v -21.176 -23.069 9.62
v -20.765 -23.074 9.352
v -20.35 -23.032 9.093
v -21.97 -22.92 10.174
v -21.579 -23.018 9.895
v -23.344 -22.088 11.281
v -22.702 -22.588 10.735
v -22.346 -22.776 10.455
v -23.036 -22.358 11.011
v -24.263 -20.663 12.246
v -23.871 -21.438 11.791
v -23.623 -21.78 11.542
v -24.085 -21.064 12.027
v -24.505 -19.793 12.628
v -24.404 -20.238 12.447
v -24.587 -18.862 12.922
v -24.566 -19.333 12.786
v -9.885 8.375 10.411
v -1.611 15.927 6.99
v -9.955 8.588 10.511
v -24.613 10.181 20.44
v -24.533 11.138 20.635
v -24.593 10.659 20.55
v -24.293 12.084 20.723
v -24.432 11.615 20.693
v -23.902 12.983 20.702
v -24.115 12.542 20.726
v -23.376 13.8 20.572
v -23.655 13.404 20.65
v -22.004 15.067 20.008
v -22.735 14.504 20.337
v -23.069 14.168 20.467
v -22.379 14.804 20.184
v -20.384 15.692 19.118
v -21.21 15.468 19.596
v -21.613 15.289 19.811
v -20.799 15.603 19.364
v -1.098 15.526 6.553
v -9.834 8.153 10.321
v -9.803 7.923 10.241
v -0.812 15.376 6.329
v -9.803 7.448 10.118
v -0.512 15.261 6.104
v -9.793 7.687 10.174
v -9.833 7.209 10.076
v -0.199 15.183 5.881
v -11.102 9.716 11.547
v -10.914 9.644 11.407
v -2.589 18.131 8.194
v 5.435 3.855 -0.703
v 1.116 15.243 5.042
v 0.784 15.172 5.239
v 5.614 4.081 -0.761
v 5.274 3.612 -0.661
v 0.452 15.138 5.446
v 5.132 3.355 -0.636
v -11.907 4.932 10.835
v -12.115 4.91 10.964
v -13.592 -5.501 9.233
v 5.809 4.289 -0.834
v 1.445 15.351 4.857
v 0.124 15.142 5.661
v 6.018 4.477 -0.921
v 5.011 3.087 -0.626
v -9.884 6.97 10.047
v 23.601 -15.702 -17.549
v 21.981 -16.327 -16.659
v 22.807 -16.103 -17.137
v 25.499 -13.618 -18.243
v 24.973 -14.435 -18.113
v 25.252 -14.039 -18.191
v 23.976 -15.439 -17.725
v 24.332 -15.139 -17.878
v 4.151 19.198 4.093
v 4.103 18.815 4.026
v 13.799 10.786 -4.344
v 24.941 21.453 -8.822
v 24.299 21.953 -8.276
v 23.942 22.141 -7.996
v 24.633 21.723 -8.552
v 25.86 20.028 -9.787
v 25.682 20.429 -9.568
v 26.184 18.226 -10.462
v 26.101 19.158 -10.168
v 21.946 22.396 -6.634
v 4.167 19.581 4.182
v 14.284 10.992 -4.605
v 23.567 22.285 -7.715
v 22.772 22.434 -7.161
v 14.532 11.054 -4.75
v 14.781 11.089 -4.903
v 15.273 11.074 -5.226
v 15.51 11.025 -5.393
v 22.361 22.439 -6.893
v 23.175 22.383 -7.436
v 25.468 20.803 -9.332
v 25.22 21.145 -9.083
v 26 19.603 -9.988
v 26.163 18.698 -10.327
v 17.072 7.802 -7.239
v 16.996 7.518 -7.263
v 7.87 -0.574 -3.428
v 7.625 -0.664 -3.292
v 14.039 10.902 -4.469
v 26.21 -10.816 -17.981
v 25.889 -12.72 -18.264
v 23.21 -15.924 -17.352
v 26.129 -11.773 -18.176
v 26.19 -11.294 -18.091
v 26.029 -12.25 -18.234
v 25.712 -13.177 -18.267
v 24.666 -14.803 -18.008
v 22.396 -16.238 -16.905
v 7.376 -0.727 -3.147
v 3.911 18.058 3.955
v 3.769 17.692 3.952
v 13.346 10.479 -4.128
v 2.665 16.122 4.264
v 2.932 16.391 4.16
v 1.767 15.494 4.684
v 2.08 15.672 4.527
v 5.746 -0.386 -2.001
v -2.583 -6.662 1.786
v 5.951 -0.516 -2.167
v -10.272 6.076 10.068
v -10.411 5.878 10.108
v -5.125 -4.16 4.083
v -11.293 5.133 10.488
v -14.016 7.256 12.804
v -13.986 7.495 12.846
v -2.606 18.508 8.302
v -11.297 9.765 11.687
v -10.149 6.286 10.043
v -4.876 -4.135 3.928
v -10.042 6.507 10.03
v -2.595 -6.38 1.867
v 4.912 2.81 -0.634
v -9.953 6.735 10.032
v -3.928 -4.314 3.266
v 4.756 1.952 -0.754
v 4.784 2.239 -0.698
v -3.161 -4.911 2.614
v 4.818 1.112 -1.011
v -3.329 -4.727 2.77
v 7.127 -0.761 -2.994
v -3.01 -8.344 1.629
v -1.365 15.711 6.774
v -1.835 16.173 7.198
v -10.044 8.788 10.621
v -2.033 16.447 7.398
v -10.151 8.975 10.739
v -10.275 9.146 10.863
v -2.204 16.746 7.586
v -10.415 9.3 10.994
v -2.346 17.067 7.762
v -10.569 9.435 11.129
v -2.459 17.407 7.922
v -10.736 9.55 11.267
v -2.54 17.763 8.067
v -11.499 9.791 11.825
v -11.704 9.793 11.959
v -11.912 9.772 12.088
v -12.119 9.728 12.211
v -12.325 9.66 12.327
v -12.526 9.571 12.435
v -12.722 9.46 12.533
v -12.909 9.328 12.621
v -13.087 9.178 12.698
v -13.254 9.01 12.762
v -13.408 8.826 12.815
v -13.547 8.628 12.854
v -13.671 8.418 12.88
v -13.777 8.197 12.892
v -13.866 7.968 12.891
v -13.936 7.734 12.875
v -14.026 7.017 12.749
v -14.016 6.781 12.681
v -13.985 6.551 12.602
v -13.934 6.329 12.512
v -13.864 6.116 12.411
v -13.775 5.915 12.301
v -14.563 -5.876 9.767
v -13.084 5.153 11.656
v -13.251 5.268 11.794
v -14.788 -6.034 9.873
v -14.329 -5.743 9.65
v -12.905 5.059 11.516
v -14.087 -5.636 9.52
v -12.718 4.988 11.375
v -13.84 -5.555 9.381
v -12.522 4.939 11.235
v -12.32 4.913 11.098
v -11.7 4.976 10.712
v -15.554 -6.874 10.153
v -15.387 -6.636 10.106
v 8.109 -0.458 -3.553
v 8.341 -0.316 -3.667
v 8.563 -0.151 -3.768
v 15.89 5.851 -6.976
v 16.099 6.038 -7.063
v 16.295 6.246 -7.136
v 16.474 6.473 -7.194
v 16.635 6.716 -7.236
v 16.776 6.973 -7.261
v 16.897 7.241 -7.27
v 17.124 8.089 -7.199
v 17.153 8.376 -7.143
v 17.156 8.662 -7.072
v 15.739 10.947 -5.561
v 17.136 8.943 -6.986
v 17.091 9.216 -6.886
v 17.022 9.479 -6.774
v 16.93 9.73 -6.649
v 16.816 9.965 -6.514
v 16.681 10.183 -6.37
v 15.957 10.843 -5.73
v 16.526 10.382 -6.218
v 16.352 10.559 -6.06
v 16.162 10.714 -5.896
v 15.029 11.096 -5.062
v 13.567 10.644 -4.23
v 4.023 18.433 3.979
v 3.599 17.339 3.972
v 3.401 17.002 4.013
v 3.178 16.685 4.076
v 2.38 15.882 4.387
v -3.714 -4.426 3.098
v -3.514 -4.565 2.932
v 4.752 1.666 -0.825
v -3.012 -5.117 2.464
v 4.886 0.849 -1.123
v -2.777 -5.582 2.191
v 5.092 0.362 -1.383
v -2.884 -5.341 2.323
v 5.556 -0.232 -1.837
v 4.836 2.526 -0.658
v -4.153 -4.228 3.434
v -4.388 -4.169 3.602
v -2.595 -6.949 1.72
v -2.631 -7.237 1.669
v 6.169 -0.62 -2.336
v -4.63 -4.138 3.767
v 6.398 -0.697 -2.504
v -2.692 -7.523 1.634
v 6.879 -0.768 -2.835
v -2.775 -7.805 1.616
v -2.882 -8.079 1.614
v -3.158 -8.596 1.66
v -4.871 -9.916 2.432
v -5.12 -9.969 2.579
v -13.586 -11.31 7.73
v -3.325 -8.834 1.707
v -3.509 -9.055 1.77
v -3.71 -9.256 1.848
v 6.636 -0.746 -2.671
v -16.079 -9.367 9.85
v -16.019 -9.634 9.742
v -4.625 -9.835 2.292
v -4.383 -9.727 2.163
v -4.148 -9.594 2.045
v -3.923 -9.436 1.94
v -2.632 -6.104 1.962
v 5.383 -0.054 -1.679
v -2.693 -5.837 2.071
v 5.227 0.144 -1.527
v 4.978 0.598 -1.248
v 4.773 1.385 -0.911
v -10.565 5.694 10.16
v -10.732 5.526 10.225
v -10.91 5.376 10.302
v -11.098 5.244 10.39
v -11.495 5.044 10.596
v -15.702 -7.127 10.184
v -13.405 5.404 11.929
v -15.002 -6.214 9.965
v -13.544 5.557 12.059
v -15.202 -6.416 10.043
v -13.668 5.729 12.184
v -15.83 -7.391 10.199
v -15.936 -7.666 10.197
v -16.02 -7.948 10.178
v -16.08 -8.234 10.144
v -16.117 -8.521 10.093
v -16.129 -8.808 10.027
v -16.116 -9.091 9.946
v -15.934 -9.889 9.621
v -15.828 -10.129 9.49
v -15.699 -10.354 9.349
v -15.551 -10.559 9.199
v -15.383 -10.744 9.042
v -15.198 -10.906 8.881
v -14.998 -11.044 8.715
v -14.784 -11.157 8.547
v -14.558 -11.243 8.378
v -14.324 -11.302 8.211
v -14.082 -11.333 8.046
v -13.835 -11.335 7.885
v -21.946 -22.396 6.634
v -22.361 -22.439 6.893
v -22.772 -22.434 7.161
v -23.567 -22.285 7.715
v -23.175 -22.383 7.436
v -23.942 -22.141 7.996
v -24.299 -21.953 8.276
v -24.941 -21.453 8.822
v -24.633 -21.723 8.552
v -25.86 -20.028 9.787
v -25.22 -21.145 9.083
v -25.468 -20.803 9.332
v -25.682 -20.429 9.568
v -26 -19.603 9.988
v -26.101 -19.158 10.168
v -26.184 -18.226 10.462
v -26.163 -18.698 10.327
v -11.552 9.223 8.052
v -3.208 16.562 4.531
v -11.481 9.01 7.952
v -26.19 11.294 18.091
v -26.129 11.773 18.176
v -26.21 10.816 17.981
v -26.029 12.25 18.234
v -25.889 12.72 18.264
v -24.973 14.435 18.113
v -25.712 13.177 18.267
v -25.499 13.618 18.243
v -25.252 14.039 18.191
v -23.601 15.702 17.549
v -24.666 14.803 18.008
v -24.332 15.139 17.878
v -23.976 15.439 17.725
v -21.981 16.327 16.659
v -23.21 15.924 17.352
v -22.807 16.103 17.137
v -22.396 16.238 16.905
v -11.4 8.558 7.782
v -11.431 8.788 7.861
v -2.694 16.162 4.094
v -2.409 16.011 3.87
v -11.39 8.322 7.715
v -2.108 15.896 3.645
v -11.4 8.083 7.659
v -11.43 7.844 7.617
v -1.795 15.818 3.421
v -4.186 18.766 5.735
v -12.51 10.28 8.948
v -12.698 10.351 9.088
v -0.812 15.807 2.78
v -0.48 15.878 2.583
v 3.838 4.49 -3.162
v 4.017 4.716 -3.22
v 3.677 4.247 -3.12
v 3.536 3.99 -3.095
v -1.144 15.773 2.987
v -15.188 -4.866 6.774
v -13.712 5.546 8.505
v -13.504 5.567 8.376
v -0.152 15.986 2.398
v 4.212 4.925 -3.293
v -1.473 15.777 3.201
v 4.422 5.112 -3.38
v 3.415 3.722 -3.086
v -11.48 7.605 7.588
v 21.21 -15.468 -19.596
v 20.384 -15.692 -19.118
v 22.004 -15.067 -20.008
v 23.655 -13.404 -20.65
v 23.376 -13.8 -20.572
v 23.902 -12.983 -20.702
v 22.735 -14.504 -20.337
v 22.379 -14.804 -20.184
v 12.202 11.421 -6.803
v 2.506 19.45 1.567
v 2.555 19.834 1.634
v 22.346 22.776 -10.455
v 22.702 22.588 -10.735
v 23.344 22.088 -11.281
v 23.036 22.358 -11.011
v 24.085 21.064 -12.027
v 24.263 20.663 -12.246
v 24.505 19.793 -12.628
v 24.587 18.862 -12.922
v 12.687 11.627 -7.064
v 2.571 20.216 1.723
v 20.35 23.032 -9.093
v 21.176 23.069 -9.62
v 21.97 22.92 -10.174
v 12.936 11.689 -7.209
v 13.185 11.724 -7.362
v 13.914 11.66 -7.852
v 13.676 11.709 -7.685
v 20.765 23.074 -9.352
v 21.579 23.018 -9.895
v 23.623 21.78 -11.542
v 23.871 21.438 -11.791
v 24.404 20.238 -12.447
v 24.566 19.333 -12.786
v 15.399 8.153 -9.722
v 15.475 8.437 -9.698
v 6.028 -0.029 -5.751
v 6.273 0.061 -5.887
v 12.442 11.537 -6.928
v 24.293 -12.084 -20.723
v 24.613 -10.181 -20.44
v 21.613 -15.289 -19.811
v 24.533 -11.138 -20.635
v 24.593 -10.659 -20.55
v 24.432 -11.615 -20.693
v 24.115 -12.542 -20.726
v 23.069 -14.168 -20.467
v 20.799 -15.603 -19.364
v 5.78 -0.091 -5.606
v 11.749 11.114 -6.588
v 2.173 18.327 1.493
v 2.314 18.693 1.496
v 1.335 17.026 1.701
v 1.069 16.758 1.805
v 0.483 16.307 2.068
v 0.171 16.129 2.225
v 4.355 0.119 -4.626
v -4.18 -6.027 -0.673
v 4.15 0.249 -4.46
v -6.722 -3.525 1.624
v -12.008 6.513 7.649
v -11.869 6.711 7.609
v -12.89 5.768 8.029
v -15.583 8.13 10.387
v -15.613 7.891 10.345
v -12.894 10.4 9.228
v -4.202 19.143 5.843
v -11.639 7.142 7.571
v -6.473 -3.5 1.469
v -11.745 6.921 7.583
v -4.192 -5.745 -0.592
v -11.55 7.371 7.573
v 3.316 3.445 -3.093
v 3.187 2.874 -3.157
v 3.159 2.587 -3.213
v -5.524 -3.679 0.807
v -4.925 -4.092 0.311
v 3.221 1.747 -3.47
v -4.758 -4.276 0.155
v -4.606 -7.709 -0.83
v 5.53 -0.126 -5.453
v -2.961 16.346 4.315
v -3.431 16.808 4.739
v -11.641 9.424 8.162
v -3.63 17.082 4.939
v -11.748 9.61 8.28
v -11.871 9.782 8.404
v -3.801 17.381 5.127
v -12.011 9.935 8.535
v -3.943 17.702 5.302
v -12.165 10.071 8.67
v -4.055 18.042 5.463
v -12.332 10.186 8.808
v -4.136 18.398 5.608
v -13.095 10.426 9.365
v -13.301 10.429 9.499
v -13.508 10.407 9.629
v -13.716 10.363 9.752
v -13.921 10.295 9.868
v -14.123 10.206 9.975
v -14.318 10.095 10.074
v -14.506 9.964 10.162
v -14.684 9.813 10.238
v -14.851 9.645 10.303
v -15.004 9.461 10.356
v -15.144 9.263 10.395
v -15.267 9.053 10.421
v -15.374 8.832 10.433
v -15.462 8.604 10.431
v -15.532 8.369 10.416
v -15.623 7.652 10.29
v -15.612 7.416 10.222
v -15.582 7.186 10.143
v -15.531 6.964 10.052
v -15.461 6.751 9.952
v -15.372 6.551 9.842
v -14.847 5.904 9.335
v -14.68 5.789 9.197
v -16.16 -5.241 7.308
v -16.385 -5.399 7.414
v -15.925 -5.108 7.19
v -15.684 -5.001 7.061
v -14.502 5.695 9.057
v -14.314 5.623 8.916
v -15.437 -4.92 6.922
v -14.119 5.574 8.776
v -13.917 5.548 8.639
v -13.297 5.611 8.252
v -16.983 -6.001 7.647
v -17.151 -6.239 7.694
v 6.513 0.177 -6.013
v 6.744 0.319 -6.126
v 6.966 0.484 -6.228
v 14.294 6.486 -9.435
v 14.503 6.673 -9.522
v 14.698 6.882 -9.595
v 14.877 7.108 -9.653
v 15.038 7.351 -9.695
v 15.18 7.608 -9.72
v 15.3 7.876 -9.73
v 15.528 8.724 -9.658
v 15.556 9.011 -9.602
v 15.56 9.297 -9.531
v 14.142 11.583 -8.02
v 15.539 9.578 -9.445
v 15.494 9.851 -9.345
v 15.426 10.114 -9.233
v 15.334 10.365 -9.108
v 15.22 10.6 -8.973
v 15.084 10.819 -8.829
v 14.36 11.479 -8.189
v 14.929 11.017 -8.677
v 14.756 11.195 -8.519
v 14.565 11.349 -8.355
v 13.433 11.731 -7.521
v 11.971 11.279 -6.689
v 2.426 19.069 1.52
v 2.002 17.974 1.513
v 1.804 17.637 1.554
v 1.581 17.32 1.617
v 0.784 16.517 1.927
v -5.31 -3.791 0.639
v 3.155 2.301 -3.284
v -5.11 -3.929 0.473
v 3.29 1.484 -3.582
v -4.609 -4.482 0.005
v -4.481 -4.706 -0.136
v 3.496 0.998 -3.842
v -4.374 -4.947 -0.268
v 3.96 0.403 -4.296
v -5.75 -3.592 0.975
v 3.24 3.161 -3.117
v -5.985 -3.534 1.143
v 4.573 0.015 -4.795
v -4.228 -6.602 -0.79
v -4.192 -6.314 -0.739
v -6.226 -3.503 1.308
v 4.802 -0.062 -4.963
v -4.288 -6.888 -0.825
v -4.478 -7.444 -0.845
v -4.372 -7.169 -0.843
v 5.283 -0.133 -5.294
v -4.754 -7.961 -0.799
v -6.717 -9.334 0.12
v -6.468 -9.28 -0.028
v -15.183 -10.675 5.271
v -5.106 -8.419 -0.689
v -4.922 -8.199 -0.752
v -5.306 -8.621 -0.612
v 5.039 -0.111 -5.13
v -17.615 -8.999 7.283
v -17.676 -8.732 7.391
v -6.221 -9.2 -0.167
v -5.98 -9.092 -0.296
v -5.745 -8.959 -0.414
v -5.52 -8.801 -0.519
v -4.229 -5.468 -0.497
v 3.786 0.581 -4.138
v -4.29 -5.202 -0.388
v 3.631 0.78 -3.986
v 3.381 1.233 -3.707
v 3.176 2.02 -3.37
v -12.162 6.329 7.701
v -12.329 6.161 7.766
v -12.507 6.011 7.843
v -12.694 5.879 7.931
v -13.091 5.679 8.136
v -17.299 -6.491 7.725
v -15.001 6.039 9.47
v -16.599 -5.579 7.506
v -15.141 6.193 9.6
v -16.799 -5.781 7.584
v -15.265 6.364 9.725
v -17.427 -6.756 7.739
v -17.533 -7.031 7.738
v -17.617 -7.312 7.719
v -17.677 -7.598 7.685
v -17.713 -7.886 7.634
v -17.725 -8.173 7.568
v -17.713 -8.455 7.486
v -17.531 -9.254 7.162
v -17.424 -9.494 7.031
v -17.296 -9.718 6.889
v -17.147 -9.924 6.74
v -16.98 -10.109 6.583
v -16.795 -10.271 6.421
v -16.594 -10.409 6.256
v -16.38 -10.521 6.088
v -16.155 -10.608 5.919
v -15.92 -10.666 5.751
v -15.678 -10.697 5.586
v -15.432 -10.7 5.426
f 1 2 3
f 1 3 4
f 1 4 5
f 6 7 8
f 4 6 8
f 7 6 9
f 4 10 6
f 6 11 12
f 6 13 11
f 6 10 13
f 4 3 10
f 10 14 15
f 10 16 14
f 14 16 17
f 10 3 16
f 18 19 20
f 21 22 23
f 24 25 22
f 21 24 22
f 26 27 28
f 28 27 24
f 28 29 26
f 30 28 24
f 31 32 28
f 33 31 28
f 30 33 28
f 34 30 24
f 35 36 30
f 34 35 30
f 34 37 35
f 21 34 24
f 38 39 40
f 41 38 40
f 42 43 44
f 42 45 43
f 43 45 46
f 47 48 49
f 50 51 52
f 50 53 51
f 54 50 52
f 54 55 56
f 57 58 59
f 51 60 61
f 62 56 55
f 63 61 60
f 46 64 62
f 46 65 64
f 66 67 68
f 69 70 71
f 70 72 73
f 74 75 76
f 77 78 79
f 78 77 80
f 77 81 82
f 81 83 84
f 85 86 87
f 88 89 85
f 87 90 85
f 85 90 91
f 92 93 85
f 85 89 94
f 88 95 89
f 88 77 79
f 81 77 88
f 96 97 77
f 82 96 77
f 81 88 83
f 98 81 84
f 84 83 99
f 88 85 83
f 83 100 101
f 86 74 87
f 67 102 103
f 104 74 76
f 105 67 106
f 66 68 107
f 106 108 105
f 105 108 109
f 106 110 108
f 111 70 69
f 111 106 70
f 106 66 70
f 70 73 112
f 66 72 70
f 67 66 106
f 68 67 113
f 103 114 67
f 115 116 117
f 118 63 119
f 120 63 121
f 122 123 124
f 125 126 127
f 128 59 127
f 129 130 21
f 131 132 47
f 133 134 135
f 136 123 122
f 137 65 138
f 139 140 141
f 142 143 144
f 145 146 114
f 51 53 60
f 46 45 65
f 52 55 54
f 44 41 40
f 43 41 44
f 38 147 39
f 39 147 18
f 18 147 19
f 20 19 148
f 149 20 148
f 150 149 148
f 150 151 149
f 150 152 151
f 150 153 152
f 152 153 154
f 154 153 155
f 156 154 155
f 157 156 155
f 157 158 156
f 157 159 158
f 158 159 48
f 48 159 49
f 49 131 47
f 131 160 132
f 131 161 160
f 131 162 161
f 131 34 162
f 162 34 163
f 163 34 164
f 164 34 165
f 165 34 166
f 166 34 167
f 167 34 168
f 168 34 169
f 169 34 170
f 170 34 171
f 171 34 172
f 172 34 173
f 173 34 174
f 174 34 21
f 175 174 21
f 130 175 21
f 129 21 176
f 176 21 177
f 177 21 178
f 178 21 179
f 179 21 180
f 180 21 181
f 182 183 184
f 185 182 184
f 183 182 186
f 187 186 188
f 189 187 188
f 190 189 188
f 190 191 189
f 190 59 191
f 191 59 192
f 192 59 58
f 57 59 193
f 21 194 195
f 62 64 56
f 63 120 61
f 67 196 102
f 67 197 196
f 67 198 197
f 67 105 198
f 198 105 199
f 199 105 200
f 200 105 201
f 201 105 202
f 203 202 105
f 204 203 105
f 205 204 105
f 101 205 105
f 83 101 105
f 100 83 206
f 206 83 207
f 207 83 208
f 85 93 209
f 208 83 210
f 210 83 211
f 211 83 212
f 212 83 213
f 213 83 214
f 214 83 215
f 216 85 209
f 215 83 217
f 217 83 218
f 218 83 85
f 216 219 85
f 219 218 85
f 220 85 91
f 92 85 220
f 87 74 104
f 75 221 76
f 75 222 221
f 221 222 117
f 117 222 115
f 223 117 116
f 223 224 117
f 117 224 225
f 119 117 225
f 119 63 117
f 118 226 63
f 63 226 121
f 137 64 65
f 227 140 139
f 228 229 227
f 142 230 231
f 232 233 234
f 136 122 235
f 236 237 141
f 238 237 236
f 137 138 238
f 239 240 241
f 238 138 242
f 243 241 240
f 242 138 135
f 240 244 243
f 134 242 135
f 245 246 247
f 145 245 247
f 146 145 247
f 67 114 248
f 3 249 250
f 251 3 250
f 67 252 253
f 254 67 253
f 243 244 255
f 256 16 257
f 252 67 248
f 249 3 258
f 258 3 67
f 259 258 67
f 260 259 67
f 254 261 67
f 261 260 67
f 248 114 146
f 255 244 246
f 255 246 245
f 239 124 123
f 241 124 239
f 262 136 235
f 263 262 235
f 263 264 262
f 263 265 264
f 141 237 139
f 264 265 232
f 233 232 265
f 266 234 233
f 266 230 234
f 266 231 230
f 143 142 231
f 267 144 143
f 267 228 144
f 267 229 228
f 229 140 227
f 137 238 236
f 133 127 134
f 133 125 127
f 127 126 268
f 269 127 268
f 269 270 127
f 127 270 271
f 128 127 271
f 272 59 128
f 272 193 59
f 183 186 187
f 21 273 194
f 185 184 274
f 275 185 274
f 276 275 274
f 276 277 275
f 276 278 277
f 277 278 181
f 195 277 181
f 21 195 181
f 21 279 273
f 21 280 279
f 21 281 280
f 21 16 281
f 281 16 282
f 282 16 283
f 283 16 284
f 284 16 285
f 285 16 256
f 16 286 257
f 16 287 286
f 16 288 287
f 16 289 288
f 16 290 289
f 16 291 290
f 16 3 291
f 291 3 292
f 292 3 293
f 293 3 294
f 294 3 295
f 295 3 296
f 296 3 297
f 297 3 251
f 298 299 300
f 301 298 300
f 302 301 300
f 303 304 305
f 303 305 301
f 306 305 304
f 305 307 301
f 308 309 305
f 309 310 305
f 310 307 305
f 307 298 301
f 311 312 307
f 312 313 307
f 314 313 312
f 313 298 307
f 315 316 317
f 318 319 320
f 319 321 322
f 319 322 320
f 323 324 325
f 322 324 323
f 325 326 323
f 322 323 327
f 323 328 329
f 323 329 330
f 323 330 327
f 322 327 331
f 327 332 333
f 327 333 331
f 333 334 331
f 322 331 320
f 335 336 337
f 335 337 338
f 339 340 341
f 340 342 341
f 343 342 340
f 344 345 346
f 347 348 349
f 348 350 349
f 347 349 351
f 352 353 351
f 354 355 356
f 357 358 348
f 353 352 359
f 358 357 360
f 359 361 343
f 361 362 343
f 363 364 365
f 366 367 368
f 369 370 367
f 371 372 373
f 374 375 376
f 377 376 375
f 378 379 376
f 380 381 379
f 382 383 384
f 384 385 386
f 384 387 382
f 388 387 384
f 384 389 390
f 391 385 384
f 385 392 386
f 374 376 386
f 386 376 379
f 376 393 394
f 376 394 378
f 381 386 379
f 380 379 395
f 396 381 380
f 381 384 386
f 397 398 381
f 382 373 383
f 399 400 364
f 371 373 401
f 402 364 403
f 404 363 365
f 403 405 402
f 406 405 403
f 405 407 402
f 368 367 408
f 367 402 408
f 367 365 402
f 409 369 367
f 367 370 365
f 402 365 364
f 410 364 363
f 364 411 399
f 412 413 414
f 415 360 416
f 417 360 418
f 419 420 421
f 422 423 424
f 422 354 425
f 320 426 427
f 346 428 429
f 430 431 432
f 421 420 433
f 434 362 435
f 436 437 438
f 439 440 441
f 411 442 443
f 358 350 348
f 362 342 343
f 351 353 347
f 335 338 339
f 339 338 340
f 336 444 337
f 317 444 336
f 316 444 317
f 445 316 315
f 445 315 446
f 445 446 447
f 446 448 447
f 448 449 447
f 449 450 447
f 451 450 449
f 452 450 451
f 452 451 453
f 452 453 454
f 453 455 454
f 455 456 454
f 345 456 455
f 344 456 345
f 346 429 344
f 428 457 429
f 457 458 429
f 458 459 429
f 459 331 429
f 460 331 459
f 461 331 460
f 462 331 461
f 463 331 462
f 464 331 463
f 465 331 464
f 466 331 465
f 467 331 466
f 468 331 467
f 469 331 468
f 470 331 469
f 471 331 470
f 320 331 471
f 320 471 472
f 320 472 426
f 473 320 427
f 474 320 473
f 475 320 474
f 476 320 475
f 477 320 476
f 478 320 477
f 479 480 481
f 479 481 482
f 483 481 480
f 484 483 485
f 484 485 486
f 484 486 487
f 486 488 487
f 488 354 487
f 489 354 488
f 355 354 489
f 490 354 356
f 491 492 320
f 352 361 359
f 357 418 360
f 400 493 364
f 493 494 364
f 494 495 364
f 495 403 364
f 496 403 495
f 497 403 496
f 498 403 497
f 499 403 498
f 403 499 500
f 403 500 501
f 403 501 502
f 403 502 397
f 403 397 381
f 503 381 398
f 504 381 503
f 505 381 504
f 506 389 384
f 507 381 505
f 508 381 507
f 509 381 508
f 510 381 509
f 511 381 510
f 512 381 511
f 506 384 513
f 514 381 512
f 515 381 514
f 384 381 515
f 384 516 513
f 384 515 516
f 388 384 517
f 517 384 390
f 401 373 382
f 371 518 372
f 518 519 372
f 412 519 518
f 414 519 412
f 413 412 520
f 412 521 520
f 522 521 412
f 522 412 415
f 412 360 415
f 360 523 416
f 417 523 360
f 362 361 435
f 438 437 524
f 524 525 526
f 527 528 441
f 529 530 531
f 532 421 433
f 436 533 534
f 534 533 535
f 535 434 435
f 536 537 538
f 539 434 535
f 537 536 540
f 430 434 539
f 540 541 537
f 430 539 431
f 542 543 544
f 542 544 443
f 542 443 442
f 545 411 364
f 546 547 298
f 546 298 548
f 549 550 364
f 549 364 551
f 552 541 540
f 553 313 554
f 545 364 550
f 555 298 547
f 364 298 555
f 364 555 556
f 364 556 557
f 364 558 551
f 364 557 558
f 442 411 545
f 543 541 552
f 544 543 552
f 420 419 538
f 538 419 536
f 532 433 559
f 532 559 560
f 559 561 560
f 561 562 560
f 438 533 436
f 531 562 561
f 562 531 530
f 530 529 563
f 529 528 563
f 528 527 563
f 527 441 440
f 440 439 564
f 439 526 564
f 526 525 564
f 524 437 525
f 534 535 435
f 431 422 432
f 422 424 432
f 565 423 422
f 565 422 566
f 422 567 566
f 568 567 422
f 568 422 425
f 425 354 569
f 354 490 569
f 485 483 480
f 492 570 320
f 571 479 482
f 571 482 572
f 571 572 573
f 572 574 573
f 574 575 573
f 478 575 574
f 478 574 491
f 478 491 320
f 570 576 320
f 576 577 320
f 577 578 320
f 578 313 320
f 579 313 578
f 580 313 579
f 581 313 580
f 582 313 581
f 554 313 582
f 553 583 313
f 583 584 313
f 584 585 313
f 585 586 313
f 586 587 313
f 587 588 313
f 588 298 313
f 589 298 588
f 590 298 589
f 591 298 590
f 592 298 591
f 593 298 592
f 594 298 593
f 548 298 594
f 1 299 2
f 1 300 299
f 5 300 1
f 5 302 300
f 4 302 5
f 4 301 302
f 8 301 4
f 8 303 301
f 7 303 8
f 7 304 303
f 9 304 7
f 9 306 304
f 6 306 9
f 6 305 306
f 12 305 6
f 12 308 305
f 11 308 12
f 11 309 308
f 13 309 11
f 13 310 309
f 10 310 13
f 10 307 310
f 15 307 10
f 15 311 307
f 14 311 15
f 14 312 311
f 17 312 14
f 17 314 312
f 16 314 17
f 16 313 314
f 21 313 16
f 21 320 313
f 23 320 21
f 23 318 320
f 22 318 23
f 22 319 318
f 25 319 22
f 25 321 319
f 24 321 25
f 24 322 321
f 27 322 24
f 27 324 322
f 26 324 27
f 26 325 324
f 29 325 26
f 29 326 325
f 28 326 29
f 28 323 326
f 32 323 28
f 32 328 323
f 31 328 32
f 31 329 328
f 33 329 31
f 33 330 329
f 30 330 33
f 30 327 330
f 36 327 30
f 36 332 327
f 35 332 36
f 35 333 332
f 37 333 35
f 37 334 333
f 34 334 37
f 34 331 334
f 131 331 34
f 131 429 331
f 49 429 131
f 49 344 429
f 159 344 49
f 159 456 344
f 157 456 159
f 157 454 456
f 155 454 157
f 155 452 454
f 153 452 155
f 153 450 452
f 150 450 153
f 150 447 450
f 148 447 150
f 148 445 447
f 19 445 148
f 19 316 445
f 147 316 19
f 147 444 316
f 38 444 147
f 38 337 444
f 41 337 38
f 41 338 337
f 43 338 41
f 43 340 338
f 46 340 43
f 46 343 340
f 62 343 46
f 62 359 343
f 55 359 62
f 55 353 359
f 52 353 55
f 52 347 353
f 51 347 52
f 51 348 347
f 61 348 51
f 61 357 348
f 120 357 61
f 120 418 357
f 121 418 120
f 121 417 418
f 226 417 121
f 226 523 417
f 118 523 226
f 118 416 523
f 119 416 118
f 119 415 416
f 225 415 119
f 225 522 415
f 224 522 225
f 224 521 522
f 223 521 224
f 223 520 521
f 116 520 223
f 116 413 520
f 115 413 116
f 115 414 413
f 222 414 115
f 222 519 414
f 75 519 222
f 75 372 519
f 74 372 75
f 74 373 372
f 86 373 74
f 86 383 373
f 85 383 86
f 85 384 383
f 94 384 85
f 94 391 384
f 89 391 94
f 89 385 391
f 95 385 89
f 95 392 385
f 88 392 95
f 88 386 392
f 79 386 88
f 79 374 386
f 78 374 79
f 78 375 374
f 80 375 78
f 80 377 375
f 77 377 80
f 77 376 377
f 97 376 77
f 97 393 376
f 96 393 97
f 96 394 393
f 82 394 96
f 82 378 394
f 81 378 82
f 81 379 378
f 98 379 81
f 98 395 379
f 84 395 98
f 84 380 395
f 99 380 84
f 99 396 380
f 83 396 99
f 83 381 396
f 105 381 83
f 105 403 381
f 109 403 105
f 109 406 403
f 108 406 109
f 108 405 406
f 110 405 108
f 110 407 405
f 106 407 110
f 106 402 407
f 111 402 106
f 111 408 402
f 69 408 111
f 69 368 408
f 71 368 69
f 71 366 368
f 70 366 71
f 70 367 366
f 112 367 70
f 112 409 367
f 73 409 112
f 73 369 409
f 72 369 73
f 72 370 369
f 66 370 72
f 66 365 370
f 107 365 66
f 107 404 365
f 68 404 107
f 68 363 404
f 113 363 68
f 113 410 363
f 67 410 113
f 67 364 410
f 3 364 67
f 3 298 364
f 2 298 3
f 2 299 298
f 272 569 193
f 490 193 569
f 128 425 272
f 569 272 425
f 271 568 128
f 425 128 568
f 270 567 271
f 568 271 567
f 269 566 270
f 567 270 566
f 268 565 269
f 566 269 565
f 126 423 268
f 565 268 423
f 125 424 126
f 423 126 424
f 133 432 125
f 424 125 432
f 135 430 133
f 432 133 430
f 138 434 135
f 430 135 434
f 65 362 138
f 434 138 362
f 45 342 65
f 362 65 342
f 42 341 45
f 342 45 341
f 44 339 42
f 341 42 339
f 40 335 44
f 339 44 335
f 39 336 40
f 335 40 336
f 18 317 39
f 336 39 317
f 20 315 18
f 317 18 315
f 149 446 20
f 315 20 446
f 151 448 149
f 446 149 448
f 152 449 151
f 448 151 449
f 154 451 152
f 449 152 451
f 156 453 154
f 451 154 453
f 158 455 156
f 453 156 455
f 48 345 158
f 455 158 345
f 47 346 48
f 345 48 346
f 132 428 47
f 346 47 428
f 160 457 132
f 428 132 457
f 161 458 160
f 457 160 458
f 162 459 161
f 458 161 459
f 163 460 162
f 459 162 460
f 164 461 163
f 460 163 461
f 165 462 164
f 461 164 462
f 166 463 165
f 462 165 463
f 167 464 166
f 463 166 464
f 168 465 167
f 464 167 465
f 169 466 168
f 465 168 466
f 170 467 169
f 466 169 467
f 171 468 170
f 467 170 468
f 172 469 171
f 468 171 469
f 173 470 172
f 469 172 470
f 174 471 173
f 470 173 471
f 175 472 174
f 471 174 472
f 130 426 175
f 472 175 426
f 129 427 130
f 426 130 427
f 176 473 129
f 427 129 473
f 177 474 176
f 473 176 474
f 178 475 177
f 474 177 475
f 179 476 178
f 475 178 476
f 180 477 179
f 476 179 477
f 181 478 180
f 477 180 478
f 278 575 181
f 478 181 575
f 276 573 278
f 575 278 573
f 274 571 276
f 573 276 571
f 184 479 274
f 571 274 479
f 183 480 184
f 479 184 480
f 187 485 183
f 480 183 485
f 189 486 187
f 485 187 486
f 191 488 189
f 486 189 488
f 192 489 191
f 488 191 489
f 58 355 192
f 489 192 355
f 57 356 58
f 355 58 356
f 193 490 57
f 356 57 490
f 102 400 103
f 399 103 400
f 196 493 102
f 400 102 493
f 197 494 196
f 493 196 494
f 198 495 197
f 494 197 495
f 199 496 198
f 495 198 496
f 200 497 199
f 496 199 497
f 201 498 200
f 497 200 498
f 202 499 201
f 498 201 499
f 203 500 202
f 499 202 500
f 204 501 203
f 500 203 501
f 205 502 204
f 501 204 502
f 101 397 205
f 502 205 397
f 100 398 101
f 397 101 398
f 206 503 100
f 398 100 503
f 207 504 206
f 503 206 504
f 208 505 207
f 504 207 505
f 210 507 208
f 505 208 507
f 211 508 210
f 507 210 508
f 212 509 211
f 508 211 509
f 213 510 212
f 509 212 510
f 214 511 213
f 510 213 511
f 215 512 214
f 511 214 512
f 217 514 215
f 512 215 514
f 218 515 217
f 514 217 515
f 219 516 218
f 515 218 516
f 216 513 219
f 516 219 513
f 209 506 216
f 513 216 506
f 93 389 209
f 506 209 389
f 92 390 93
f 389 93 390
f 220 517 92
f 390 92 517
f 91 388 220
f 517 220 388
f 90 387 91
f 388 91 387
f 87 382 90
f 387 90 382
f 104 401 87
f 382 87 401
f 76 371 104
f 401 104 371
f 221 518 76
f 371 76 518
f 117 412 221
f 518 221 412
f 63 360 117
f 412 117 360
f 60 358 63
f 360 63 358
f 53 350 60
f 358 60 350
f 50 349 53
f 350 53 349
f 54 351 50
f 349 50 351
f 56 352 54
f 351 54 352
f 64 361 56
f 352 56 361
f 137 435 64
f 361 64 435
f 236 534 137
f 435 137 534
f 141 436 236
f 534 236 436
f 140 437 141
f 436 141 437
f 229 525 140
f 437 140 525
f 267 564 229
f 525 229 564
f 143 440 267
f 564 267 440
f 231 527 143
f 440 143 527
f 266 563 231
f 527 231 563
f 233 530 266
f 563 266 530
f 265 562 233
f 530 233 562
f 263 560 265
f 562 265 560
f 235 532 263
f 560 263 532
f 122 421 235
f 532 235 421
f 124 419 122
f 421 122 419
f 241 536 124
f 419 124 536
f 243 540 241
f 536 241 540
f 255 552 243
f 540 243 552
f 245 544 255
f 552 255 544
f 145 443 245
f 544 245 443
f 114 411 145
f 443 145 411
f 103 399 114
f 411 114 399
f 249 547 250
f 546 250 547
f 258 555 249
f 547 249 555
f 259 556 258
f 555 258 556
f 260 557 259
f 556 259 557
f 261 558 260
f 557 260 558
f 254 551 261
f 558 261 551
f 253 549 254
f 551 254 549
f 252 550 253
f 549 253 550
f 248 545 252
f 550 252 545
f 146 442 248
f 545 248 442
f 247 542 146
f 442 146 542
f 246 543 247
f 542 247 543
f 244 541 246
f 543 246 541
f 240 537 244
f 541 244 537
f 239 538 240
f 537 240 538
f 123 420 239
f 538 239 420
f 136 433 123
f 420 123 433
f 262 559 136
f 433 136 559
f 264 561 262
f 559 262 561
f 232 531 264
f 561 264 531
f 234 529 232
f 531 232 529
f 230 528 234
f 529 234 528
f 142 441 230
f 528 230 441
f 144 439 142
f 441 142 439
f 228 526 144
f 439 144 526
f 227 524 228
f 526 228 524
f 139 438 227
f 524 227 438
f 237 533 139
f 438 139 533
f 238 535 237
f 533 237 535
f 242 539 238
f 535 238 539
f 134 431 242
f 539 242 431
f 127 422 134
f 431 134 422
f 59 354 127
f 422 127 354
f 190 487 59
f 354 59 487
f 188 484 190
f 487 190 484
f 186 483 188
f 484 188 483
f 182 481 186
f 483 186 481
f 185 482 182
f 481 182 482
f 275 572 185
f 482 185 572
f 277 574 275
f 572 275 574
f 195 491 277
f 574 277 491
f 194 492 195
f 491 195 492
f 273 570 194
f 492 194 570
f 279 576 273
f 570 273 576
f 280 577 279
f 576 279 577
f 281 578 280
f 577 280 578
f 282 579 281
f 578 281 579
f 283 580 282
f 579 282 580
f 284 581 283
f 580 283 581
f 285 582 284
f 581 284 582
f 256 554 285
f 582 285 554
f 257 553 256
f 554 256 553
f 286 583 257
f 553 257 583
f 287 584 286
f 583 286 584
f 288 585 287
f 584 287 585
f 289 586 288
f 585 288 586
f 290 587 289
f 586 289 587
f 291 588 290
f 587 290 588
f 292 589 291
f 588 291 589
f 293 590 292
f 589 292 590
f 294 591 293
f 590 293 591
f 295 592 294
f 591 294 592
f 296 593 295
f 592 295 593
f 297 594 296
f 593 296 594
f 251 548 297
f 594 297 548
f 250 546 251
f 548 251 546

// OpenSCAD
// Source: tests/data/segmentation/rounded_plate_rotated.scad
// Gate limit: 0.0812145360446 mm; measured Hausdorff: 0.0000020993158685 mm
// Before snapping Hausdorff: 0.00000253009686947 mm
// How to edit: change Customizer parameters; host expressions move attached features.
// Assertions stop edits that violate linked dimensions. Distances are in mm.
/* [Body] */
// plate length (raw 60.0000001076)
plate_length = 60; // [0.01:0.01:120.000000215]
// plate width (raw 40.0000009568)
plate_width = 40; // [0.01:0.01:80.0000019136]
// plate thickness (raw 2.99999996955)
plate_thickness = 3; // [0.01:0.01:5.99999993909]
/* [Corner 1] */
// corner 1 radius (raw 4.99999976099)
corner_1_radius = 5; // [0.01:0.01:20.0000004784]
/* [Corner 2] */
// corner 2 radius (raw 4.99999947931)
corner_2_radius = 5; // [0.01:0.01:20.0000004784]
/* [Corner 3] */
// corner 3 radius (raw 4.99999973866)
corner_3_radius = 5; // [0.01:0.01:20.0000004784]
/* [Arc 1] */
// arc 1 radius (raw 4.00000001128)
arc_1_radius = 4; // [0.01:0.01:20.0000004784]
// arc 1 x (raw 29.9999994363)
arc_1_x = 30; // [-60.0000001076:0.01:120.000000215]
/* [Corner 4] */
// corner 4 radius (raw 4.99999978821)
corner_4_radius = 5; // [0.01:0.01:20.0000004784]
/* [Hole 1] */
// hole 1 x (raw 44.9999995432)
hole_1_x = 45; // [0:0.01:60.0000001076]
// hole 1 y (raw 30.0000008521)
hole_1_y = 30; // [0:0.01:40.0000009568]
// hole 1 diameter (raw 5.00000007469)
hole_1_diameter = 5; // [0.01:0.01:40.0000009568]
/* [Slot 1] */
// slot 1 x (raw 41.9999998091)
slot_1_x = 42; // [0:0.01:60.0000001076]
// slot 1 y (raw 14.0000007292)
slot_1_y = 14; // [0:0.01:40.0000009568]
// slot 1 width (raw 6.00000023036)
slot_1_width = 6; // [0.01:0.01:40.0000009568]
// slot 1 length (raw 16.0000000494)
slot_1_length = 16; // [0.01:0.01:72.1110261296]
// slot 1 angle (raw 0.00000105303786313)
slot_1_angle = 0; // [-180:0.01:180]
/* [Slot 2] */
// slot 2 x (raw 17.9999996484)
slot_2_x = 18; // [0:0.01:60.0000001076]
// slot 2 y (raw 24.0000004439)
slot_2_y = 24; // [0:0.01:40.0000009568]
// slot 2 width (raw 6.00000000133)
slot_2_width = 6; // [0.01:0.01:40.0000009568]
// slot 2 length (raw 16.0000000343)
slot_2_length = 16; // [0.01:0.01:72.1110261296]
// slot 2 angle (raw -29.9999990698)
slot_2_angle = -30; // [-180:0.01:180]
/* [Resolution] */
// corner 1 segments; a higher value gives a smoother part (raw 64)
corner_1_segments = 64; // [5:1:256]
// corner 2 segments; a higher value gives a smoother part (raw 64)
corner_2_segments = 64; // [5:1:256]
// corner 3 segments; a higher value gives a smoother part (raw 64)
corner_3_segments = 64; // [5:1:256]
// arc 1 segments; a higher value gives a smoother part (raw 64)
arc_1_segments = 64; // [5:1:256]
// corner 4 segments; a higher value gives a smoother part (raw 64)
corner_4_segments = 64; // [5:1:256]
// hole 1 segments; a higher value gives a smoother part (raw 64)
hole_1_segments = 64; // [5:1:256]
// slot 1 segments; a higher value gives a smoother part (raw 64)
slot_1_segments = 64; // [5:1:256]
// slot 2 segments; a higher value gives a smoother part (raw 64)
slot_2_segments = 64; // [5:1:256]
/* [Hidden] */
// End chords are clipped against the original regular polygon, not its incircle.
function _arc_point(c,r,a,phase,n) = let(s=360/n,m=phase+(floor((a-phase)/s)+0.5)*s,
    d=r*cos(s/2)/cos(a-m)) c+d*[cos(a),sin(a)];
function _arc(c,r,a,sweep,phase,n) = let(s=360/n,b=a+sweep,
    k0=floor((min(a,b)-phase)/s)+1,k1=ceil((max(a,b)-phase)/s)-1,
    v=k0<=k1 ? [for(k=[k0:k1]) c+r*[cos(phase+k*s),sin(phase+k*s)]] : [])
    concat([_arc_point(c,r,a,phase,n)],sweep>0?v:(len(v)?[for(i=[len(v)-1:-1:0]) v[i]]:[]),
           [_arc_point(c,r,b,phase,n)]);
function _cross(a,b) = a.x*b.y-a.y*b.x;
function _point_segment(p,a,b) = let(d=b-a,t=d*d>0?max(0,min(1,((p-a)*d)/(d*d))):0) norm(p-a-t*d);
function _segment_distance(a,b,c,d) =
    _cross(b-a,c-a)*_cross(b-a,d-a)<0 && _cross(d-c,a-c)*_cross(d-c,b-c)<0 ? 0 :
    min(_point_segment(a,c,d),_point_segment(b,c,d),_point_segment(c,a,b),_point_segment(d,a,b));
function _inside(p,poly) = len([for(i=[0:len(poly)-1]) let(a=poly[i],b=poly[(i+1)%len(poly)])
    if((a.y>p.y)!=(b.y>p.y)) if(p.x < (b.x-a.x)*(p.y-a.y)/(b.y-a.y)+a.x) 1])%2 == 1;
function _capsule_inside(a,b,r,poly) = _inside((a+b)/2,poly) &&
    min([for(i=[0:len(poly)-1]) _segment_distance(a,b,poly[i],poly[(i+1)%len(poly)])]) > r;

_corner_1_start = _arc_point([corner_1_radius, corner_1_radius], corner_1_radius, 180, -101.250003882, corner_1_segments);
_corner_1_end = _arc_point([corner_1_radius, corner_1_radius], corner_1_radius, 270, -101.250003882, corner_1_segments);
_corner_2_start = _arc_point([plate_length-corner_2_radius, corner_2_radius], corner_2_radius, -90, -5.6249927909, corner_2_segments);
_corner_2_end = _arc_point([plate_length-corner_2_radius, corner_2_radius], corner_2_radius, 0, -5.6249927909, corner_2_segments);
_corner_3_start = _arc_point([plate_length-corner_3_radius, plate_width-corner_3_radius], corner_3_radius, 0, 84.3749960715, corner_3_segments);
_corner_3_end = _arc_point([plate_length-corner_3_radius, plate_width-corner_3_radius], corner_3_radius, 90, 84.3749960715, corner_3_segments);
_arc_1_start = _arc_point([arc_1_x, plate_width], arc_1_radius, 0, -174.375010936, arc_1_segments);
_arc_1_end = _arc_point([arc_1_x, plate_width], arc_1_radius, -180, -174.375010936, arc_1_segments);
_corner_4_start = _arc_point([corner_4_radius, plate_width-corner_4_radius], corner_4_radius, 90, 174.375008044, corner_4_segments);
_corner_4_end = _arc_point([corner_4_radius, plate_width-corner_4_radius], corner_4_radius, 180, 174.375008044, corner_4_segments);
_outline = concat(
  // face F0 corner_1 (cylinder)
  _arc([corner_1_radius, corner_1_radius], corner_1_radius, 180, 90, -101.250003882, corner_1_segments),
  // face F9 segment_2 (plane)
  [_corner_1_end, _corner_2_start],
  // face F8 corner_2 (cylinder)
  _arc([plate_length-corner_2_radius, corner_2_radius], corner_2_radius, -90, 90, -5.6249927909, corner_2_segments),
  // face F7 segment_4 (plane)
  [_corner_2_end, _corner_3_start],
  // face F6 corner_3 (cylinder)
  _arc([plate_length-corner_3_radius, plate_width-corner_3_radius], corner_3_radius, 0, 90, 84.3749960715, corner_3_segments),
  // face F5 segment_6 (plane)
  [_corner_3_end, _arc_1_start],
  // face F4 arc_1 (cylinder)
  _arc([arc_1_x, plate_width], arc_1_radius, 0, -180, -174.375010936, arc_1_segments),
  // face F3 segment_8 (plane)
  [_arc_1_end, _corner_4_start],
  // face F2 corner_4 (cylinder)
  _arc([corner_4_radius, plate_width-corner_4_radius], corner_4_radius, 90, 90, 174.375008044, corner_4_segments),
  // face F1 segment_10 (plane)
  [_corner_4_end, _corner_1_start]
);
_slot_1_start = [slot_1_x, slot_1_y]-((slot_1_length-slot_1_width)/2)*[cos(slot_1_angle),sin(slot_1_angle)];
_slot_1_end = [slot_1_x, slot_1_y]+((slot_1_length-slot_1_width)/2)*[cos(slot_1_angle),sin(slot_1_angle)];
_slot_2_start = [slot_2_x, slot_2_y]-((slot_2_length-slot_2_width)/2)*[cos(slot_2_angle),sin(slot_2_angle)];
_slot_2_end = [slot_2_x, slot_2_y]+((slot_2_length-slot_2_width)/2)*[cos(slot_2_angle),sin(slot_2_angle)];
assert(corner_1_radius < min(plate_length,plate_width)/2, "corner_1 must fit the available outline");
assert(corner_2_radius < min(plate_length,plate_width)/2, "corner_2 must fit the available outline");
assert(corner_3_radius < min(plate_length,plate_width)/2, "corner_3 must fit the available outline");
assert(arc_1_radius < min(plate_length,plate_width)/2, "arc_1 must fit the available outline");
assert(corner_4_radius < min(plate_length,plate_width)/2, "corner_4 must fit the available outline");
assert(_capsule_inside([hole_1_x,hole_1_y],[hole_1_x,hole_1_y],hole_1_diameter/2,_outline), "hole_1 must stay inside the outline");
assert(slot_1_length > slot_1_width, "slot_1 length must exceed its width");
assert(_capsule_inside(_slot_1_start,_slot_1_end,slot_1_width/2,_outline), "slot_1 must stay inside the outline");
assert(_segment_distance(_slot_1_start,_slot_1_end,[hole_1_x,hole_1_y],[hole_1_x,hole_1_y]) > (slot_1_width/2)+(hole_1_diameter/2), "slot_1 must not overlap hole_1");
assert(slot_2_length > slot_2_width, "slot_2 length must exceed its width");
assert(_capsule_inside(_slot_2_start,_slot_2_end,slot_2_width/2,_outline), "slot_2 must stay inside the outline");
assert(_segment_distance(_slot_2_start,_slot_2_end,[hole_1_x,hole_1_y],[hole_1_x,hole_1_y]) > (slot_2_width/2)+(hole_1_diameter/2), "slot_2 must not overlap hole_1");
assert(_segment_distance(_slot_2_start,_slot_2_end,_slot_1_start,_slot_1_end) > (slot_2_width/2)+(slot_1_width/2), "slot_2 must not overlap slot_1");
multmatrix([[-0.846614148178, -0.000870393273306, -0.532206469823, 26.2141417786], [-0.134090520714, 0.968087357371, 0.211722933933, -15.6566165478], [0.515038072729, 0.250611474027, -0.819713164909, -19.2338019309], [0, 0, 0, 1]])
linear_extrude(height=plate_thickness) difference() {
  // face F0 corner_1 (cylinder)
  // face F1 segment_10 (plane)
  // face F2 corner_4 (cylinder)
  // face F3 segment_8 (plane)
  // face F4 arc_1 (cylinder)
  // face F5 segment_6 (plane)
  // face F6 corner_3 (cylinder)
  // face F7 segment_4 (plane)
  // face F8 corner_2 (cylinder)
  // face F9 segment_2 (plane)
  // face F19 end_cap (plane)
  // face F20 end_cap (plane)
  polygon(points=_outline);
  // face F10 hole_1 (cylinder)
  translate([hole_1_x, hole_1_y]) rotate(-78.7499901138)
    circle(d=hole_1_diameter, $fn=hole_1_segments);
  // face F15 slot_1 (cylinder)
  // face F16 slot_1 (plane)
  // face F17 slot_1 (cylinder)
  // face F18 slot_1 (plane)
  hull() for(p=[_slot_1_start,_slot_1_end]) translate(p)
    rotate(-84.3750016743+slot_1_angle-(0.00000105303786313)) circle(d=slot_1_width, $fn=slot_1_segments);
  // face F11 slot_2 (cylinder)
  // face F12 slot_2 (plane)
  // face F13 slot_2 (cylinder)
  // face F14 slot_2 (plane)
  hull() for(p=[_slot_2_start,_slot_2_end]) translate(p)
    rotate(-80.6249986085+slot_2_angle-(-29.9999990698)) circle(d=slot_2_width, $fn=slot_2_segments);
}
